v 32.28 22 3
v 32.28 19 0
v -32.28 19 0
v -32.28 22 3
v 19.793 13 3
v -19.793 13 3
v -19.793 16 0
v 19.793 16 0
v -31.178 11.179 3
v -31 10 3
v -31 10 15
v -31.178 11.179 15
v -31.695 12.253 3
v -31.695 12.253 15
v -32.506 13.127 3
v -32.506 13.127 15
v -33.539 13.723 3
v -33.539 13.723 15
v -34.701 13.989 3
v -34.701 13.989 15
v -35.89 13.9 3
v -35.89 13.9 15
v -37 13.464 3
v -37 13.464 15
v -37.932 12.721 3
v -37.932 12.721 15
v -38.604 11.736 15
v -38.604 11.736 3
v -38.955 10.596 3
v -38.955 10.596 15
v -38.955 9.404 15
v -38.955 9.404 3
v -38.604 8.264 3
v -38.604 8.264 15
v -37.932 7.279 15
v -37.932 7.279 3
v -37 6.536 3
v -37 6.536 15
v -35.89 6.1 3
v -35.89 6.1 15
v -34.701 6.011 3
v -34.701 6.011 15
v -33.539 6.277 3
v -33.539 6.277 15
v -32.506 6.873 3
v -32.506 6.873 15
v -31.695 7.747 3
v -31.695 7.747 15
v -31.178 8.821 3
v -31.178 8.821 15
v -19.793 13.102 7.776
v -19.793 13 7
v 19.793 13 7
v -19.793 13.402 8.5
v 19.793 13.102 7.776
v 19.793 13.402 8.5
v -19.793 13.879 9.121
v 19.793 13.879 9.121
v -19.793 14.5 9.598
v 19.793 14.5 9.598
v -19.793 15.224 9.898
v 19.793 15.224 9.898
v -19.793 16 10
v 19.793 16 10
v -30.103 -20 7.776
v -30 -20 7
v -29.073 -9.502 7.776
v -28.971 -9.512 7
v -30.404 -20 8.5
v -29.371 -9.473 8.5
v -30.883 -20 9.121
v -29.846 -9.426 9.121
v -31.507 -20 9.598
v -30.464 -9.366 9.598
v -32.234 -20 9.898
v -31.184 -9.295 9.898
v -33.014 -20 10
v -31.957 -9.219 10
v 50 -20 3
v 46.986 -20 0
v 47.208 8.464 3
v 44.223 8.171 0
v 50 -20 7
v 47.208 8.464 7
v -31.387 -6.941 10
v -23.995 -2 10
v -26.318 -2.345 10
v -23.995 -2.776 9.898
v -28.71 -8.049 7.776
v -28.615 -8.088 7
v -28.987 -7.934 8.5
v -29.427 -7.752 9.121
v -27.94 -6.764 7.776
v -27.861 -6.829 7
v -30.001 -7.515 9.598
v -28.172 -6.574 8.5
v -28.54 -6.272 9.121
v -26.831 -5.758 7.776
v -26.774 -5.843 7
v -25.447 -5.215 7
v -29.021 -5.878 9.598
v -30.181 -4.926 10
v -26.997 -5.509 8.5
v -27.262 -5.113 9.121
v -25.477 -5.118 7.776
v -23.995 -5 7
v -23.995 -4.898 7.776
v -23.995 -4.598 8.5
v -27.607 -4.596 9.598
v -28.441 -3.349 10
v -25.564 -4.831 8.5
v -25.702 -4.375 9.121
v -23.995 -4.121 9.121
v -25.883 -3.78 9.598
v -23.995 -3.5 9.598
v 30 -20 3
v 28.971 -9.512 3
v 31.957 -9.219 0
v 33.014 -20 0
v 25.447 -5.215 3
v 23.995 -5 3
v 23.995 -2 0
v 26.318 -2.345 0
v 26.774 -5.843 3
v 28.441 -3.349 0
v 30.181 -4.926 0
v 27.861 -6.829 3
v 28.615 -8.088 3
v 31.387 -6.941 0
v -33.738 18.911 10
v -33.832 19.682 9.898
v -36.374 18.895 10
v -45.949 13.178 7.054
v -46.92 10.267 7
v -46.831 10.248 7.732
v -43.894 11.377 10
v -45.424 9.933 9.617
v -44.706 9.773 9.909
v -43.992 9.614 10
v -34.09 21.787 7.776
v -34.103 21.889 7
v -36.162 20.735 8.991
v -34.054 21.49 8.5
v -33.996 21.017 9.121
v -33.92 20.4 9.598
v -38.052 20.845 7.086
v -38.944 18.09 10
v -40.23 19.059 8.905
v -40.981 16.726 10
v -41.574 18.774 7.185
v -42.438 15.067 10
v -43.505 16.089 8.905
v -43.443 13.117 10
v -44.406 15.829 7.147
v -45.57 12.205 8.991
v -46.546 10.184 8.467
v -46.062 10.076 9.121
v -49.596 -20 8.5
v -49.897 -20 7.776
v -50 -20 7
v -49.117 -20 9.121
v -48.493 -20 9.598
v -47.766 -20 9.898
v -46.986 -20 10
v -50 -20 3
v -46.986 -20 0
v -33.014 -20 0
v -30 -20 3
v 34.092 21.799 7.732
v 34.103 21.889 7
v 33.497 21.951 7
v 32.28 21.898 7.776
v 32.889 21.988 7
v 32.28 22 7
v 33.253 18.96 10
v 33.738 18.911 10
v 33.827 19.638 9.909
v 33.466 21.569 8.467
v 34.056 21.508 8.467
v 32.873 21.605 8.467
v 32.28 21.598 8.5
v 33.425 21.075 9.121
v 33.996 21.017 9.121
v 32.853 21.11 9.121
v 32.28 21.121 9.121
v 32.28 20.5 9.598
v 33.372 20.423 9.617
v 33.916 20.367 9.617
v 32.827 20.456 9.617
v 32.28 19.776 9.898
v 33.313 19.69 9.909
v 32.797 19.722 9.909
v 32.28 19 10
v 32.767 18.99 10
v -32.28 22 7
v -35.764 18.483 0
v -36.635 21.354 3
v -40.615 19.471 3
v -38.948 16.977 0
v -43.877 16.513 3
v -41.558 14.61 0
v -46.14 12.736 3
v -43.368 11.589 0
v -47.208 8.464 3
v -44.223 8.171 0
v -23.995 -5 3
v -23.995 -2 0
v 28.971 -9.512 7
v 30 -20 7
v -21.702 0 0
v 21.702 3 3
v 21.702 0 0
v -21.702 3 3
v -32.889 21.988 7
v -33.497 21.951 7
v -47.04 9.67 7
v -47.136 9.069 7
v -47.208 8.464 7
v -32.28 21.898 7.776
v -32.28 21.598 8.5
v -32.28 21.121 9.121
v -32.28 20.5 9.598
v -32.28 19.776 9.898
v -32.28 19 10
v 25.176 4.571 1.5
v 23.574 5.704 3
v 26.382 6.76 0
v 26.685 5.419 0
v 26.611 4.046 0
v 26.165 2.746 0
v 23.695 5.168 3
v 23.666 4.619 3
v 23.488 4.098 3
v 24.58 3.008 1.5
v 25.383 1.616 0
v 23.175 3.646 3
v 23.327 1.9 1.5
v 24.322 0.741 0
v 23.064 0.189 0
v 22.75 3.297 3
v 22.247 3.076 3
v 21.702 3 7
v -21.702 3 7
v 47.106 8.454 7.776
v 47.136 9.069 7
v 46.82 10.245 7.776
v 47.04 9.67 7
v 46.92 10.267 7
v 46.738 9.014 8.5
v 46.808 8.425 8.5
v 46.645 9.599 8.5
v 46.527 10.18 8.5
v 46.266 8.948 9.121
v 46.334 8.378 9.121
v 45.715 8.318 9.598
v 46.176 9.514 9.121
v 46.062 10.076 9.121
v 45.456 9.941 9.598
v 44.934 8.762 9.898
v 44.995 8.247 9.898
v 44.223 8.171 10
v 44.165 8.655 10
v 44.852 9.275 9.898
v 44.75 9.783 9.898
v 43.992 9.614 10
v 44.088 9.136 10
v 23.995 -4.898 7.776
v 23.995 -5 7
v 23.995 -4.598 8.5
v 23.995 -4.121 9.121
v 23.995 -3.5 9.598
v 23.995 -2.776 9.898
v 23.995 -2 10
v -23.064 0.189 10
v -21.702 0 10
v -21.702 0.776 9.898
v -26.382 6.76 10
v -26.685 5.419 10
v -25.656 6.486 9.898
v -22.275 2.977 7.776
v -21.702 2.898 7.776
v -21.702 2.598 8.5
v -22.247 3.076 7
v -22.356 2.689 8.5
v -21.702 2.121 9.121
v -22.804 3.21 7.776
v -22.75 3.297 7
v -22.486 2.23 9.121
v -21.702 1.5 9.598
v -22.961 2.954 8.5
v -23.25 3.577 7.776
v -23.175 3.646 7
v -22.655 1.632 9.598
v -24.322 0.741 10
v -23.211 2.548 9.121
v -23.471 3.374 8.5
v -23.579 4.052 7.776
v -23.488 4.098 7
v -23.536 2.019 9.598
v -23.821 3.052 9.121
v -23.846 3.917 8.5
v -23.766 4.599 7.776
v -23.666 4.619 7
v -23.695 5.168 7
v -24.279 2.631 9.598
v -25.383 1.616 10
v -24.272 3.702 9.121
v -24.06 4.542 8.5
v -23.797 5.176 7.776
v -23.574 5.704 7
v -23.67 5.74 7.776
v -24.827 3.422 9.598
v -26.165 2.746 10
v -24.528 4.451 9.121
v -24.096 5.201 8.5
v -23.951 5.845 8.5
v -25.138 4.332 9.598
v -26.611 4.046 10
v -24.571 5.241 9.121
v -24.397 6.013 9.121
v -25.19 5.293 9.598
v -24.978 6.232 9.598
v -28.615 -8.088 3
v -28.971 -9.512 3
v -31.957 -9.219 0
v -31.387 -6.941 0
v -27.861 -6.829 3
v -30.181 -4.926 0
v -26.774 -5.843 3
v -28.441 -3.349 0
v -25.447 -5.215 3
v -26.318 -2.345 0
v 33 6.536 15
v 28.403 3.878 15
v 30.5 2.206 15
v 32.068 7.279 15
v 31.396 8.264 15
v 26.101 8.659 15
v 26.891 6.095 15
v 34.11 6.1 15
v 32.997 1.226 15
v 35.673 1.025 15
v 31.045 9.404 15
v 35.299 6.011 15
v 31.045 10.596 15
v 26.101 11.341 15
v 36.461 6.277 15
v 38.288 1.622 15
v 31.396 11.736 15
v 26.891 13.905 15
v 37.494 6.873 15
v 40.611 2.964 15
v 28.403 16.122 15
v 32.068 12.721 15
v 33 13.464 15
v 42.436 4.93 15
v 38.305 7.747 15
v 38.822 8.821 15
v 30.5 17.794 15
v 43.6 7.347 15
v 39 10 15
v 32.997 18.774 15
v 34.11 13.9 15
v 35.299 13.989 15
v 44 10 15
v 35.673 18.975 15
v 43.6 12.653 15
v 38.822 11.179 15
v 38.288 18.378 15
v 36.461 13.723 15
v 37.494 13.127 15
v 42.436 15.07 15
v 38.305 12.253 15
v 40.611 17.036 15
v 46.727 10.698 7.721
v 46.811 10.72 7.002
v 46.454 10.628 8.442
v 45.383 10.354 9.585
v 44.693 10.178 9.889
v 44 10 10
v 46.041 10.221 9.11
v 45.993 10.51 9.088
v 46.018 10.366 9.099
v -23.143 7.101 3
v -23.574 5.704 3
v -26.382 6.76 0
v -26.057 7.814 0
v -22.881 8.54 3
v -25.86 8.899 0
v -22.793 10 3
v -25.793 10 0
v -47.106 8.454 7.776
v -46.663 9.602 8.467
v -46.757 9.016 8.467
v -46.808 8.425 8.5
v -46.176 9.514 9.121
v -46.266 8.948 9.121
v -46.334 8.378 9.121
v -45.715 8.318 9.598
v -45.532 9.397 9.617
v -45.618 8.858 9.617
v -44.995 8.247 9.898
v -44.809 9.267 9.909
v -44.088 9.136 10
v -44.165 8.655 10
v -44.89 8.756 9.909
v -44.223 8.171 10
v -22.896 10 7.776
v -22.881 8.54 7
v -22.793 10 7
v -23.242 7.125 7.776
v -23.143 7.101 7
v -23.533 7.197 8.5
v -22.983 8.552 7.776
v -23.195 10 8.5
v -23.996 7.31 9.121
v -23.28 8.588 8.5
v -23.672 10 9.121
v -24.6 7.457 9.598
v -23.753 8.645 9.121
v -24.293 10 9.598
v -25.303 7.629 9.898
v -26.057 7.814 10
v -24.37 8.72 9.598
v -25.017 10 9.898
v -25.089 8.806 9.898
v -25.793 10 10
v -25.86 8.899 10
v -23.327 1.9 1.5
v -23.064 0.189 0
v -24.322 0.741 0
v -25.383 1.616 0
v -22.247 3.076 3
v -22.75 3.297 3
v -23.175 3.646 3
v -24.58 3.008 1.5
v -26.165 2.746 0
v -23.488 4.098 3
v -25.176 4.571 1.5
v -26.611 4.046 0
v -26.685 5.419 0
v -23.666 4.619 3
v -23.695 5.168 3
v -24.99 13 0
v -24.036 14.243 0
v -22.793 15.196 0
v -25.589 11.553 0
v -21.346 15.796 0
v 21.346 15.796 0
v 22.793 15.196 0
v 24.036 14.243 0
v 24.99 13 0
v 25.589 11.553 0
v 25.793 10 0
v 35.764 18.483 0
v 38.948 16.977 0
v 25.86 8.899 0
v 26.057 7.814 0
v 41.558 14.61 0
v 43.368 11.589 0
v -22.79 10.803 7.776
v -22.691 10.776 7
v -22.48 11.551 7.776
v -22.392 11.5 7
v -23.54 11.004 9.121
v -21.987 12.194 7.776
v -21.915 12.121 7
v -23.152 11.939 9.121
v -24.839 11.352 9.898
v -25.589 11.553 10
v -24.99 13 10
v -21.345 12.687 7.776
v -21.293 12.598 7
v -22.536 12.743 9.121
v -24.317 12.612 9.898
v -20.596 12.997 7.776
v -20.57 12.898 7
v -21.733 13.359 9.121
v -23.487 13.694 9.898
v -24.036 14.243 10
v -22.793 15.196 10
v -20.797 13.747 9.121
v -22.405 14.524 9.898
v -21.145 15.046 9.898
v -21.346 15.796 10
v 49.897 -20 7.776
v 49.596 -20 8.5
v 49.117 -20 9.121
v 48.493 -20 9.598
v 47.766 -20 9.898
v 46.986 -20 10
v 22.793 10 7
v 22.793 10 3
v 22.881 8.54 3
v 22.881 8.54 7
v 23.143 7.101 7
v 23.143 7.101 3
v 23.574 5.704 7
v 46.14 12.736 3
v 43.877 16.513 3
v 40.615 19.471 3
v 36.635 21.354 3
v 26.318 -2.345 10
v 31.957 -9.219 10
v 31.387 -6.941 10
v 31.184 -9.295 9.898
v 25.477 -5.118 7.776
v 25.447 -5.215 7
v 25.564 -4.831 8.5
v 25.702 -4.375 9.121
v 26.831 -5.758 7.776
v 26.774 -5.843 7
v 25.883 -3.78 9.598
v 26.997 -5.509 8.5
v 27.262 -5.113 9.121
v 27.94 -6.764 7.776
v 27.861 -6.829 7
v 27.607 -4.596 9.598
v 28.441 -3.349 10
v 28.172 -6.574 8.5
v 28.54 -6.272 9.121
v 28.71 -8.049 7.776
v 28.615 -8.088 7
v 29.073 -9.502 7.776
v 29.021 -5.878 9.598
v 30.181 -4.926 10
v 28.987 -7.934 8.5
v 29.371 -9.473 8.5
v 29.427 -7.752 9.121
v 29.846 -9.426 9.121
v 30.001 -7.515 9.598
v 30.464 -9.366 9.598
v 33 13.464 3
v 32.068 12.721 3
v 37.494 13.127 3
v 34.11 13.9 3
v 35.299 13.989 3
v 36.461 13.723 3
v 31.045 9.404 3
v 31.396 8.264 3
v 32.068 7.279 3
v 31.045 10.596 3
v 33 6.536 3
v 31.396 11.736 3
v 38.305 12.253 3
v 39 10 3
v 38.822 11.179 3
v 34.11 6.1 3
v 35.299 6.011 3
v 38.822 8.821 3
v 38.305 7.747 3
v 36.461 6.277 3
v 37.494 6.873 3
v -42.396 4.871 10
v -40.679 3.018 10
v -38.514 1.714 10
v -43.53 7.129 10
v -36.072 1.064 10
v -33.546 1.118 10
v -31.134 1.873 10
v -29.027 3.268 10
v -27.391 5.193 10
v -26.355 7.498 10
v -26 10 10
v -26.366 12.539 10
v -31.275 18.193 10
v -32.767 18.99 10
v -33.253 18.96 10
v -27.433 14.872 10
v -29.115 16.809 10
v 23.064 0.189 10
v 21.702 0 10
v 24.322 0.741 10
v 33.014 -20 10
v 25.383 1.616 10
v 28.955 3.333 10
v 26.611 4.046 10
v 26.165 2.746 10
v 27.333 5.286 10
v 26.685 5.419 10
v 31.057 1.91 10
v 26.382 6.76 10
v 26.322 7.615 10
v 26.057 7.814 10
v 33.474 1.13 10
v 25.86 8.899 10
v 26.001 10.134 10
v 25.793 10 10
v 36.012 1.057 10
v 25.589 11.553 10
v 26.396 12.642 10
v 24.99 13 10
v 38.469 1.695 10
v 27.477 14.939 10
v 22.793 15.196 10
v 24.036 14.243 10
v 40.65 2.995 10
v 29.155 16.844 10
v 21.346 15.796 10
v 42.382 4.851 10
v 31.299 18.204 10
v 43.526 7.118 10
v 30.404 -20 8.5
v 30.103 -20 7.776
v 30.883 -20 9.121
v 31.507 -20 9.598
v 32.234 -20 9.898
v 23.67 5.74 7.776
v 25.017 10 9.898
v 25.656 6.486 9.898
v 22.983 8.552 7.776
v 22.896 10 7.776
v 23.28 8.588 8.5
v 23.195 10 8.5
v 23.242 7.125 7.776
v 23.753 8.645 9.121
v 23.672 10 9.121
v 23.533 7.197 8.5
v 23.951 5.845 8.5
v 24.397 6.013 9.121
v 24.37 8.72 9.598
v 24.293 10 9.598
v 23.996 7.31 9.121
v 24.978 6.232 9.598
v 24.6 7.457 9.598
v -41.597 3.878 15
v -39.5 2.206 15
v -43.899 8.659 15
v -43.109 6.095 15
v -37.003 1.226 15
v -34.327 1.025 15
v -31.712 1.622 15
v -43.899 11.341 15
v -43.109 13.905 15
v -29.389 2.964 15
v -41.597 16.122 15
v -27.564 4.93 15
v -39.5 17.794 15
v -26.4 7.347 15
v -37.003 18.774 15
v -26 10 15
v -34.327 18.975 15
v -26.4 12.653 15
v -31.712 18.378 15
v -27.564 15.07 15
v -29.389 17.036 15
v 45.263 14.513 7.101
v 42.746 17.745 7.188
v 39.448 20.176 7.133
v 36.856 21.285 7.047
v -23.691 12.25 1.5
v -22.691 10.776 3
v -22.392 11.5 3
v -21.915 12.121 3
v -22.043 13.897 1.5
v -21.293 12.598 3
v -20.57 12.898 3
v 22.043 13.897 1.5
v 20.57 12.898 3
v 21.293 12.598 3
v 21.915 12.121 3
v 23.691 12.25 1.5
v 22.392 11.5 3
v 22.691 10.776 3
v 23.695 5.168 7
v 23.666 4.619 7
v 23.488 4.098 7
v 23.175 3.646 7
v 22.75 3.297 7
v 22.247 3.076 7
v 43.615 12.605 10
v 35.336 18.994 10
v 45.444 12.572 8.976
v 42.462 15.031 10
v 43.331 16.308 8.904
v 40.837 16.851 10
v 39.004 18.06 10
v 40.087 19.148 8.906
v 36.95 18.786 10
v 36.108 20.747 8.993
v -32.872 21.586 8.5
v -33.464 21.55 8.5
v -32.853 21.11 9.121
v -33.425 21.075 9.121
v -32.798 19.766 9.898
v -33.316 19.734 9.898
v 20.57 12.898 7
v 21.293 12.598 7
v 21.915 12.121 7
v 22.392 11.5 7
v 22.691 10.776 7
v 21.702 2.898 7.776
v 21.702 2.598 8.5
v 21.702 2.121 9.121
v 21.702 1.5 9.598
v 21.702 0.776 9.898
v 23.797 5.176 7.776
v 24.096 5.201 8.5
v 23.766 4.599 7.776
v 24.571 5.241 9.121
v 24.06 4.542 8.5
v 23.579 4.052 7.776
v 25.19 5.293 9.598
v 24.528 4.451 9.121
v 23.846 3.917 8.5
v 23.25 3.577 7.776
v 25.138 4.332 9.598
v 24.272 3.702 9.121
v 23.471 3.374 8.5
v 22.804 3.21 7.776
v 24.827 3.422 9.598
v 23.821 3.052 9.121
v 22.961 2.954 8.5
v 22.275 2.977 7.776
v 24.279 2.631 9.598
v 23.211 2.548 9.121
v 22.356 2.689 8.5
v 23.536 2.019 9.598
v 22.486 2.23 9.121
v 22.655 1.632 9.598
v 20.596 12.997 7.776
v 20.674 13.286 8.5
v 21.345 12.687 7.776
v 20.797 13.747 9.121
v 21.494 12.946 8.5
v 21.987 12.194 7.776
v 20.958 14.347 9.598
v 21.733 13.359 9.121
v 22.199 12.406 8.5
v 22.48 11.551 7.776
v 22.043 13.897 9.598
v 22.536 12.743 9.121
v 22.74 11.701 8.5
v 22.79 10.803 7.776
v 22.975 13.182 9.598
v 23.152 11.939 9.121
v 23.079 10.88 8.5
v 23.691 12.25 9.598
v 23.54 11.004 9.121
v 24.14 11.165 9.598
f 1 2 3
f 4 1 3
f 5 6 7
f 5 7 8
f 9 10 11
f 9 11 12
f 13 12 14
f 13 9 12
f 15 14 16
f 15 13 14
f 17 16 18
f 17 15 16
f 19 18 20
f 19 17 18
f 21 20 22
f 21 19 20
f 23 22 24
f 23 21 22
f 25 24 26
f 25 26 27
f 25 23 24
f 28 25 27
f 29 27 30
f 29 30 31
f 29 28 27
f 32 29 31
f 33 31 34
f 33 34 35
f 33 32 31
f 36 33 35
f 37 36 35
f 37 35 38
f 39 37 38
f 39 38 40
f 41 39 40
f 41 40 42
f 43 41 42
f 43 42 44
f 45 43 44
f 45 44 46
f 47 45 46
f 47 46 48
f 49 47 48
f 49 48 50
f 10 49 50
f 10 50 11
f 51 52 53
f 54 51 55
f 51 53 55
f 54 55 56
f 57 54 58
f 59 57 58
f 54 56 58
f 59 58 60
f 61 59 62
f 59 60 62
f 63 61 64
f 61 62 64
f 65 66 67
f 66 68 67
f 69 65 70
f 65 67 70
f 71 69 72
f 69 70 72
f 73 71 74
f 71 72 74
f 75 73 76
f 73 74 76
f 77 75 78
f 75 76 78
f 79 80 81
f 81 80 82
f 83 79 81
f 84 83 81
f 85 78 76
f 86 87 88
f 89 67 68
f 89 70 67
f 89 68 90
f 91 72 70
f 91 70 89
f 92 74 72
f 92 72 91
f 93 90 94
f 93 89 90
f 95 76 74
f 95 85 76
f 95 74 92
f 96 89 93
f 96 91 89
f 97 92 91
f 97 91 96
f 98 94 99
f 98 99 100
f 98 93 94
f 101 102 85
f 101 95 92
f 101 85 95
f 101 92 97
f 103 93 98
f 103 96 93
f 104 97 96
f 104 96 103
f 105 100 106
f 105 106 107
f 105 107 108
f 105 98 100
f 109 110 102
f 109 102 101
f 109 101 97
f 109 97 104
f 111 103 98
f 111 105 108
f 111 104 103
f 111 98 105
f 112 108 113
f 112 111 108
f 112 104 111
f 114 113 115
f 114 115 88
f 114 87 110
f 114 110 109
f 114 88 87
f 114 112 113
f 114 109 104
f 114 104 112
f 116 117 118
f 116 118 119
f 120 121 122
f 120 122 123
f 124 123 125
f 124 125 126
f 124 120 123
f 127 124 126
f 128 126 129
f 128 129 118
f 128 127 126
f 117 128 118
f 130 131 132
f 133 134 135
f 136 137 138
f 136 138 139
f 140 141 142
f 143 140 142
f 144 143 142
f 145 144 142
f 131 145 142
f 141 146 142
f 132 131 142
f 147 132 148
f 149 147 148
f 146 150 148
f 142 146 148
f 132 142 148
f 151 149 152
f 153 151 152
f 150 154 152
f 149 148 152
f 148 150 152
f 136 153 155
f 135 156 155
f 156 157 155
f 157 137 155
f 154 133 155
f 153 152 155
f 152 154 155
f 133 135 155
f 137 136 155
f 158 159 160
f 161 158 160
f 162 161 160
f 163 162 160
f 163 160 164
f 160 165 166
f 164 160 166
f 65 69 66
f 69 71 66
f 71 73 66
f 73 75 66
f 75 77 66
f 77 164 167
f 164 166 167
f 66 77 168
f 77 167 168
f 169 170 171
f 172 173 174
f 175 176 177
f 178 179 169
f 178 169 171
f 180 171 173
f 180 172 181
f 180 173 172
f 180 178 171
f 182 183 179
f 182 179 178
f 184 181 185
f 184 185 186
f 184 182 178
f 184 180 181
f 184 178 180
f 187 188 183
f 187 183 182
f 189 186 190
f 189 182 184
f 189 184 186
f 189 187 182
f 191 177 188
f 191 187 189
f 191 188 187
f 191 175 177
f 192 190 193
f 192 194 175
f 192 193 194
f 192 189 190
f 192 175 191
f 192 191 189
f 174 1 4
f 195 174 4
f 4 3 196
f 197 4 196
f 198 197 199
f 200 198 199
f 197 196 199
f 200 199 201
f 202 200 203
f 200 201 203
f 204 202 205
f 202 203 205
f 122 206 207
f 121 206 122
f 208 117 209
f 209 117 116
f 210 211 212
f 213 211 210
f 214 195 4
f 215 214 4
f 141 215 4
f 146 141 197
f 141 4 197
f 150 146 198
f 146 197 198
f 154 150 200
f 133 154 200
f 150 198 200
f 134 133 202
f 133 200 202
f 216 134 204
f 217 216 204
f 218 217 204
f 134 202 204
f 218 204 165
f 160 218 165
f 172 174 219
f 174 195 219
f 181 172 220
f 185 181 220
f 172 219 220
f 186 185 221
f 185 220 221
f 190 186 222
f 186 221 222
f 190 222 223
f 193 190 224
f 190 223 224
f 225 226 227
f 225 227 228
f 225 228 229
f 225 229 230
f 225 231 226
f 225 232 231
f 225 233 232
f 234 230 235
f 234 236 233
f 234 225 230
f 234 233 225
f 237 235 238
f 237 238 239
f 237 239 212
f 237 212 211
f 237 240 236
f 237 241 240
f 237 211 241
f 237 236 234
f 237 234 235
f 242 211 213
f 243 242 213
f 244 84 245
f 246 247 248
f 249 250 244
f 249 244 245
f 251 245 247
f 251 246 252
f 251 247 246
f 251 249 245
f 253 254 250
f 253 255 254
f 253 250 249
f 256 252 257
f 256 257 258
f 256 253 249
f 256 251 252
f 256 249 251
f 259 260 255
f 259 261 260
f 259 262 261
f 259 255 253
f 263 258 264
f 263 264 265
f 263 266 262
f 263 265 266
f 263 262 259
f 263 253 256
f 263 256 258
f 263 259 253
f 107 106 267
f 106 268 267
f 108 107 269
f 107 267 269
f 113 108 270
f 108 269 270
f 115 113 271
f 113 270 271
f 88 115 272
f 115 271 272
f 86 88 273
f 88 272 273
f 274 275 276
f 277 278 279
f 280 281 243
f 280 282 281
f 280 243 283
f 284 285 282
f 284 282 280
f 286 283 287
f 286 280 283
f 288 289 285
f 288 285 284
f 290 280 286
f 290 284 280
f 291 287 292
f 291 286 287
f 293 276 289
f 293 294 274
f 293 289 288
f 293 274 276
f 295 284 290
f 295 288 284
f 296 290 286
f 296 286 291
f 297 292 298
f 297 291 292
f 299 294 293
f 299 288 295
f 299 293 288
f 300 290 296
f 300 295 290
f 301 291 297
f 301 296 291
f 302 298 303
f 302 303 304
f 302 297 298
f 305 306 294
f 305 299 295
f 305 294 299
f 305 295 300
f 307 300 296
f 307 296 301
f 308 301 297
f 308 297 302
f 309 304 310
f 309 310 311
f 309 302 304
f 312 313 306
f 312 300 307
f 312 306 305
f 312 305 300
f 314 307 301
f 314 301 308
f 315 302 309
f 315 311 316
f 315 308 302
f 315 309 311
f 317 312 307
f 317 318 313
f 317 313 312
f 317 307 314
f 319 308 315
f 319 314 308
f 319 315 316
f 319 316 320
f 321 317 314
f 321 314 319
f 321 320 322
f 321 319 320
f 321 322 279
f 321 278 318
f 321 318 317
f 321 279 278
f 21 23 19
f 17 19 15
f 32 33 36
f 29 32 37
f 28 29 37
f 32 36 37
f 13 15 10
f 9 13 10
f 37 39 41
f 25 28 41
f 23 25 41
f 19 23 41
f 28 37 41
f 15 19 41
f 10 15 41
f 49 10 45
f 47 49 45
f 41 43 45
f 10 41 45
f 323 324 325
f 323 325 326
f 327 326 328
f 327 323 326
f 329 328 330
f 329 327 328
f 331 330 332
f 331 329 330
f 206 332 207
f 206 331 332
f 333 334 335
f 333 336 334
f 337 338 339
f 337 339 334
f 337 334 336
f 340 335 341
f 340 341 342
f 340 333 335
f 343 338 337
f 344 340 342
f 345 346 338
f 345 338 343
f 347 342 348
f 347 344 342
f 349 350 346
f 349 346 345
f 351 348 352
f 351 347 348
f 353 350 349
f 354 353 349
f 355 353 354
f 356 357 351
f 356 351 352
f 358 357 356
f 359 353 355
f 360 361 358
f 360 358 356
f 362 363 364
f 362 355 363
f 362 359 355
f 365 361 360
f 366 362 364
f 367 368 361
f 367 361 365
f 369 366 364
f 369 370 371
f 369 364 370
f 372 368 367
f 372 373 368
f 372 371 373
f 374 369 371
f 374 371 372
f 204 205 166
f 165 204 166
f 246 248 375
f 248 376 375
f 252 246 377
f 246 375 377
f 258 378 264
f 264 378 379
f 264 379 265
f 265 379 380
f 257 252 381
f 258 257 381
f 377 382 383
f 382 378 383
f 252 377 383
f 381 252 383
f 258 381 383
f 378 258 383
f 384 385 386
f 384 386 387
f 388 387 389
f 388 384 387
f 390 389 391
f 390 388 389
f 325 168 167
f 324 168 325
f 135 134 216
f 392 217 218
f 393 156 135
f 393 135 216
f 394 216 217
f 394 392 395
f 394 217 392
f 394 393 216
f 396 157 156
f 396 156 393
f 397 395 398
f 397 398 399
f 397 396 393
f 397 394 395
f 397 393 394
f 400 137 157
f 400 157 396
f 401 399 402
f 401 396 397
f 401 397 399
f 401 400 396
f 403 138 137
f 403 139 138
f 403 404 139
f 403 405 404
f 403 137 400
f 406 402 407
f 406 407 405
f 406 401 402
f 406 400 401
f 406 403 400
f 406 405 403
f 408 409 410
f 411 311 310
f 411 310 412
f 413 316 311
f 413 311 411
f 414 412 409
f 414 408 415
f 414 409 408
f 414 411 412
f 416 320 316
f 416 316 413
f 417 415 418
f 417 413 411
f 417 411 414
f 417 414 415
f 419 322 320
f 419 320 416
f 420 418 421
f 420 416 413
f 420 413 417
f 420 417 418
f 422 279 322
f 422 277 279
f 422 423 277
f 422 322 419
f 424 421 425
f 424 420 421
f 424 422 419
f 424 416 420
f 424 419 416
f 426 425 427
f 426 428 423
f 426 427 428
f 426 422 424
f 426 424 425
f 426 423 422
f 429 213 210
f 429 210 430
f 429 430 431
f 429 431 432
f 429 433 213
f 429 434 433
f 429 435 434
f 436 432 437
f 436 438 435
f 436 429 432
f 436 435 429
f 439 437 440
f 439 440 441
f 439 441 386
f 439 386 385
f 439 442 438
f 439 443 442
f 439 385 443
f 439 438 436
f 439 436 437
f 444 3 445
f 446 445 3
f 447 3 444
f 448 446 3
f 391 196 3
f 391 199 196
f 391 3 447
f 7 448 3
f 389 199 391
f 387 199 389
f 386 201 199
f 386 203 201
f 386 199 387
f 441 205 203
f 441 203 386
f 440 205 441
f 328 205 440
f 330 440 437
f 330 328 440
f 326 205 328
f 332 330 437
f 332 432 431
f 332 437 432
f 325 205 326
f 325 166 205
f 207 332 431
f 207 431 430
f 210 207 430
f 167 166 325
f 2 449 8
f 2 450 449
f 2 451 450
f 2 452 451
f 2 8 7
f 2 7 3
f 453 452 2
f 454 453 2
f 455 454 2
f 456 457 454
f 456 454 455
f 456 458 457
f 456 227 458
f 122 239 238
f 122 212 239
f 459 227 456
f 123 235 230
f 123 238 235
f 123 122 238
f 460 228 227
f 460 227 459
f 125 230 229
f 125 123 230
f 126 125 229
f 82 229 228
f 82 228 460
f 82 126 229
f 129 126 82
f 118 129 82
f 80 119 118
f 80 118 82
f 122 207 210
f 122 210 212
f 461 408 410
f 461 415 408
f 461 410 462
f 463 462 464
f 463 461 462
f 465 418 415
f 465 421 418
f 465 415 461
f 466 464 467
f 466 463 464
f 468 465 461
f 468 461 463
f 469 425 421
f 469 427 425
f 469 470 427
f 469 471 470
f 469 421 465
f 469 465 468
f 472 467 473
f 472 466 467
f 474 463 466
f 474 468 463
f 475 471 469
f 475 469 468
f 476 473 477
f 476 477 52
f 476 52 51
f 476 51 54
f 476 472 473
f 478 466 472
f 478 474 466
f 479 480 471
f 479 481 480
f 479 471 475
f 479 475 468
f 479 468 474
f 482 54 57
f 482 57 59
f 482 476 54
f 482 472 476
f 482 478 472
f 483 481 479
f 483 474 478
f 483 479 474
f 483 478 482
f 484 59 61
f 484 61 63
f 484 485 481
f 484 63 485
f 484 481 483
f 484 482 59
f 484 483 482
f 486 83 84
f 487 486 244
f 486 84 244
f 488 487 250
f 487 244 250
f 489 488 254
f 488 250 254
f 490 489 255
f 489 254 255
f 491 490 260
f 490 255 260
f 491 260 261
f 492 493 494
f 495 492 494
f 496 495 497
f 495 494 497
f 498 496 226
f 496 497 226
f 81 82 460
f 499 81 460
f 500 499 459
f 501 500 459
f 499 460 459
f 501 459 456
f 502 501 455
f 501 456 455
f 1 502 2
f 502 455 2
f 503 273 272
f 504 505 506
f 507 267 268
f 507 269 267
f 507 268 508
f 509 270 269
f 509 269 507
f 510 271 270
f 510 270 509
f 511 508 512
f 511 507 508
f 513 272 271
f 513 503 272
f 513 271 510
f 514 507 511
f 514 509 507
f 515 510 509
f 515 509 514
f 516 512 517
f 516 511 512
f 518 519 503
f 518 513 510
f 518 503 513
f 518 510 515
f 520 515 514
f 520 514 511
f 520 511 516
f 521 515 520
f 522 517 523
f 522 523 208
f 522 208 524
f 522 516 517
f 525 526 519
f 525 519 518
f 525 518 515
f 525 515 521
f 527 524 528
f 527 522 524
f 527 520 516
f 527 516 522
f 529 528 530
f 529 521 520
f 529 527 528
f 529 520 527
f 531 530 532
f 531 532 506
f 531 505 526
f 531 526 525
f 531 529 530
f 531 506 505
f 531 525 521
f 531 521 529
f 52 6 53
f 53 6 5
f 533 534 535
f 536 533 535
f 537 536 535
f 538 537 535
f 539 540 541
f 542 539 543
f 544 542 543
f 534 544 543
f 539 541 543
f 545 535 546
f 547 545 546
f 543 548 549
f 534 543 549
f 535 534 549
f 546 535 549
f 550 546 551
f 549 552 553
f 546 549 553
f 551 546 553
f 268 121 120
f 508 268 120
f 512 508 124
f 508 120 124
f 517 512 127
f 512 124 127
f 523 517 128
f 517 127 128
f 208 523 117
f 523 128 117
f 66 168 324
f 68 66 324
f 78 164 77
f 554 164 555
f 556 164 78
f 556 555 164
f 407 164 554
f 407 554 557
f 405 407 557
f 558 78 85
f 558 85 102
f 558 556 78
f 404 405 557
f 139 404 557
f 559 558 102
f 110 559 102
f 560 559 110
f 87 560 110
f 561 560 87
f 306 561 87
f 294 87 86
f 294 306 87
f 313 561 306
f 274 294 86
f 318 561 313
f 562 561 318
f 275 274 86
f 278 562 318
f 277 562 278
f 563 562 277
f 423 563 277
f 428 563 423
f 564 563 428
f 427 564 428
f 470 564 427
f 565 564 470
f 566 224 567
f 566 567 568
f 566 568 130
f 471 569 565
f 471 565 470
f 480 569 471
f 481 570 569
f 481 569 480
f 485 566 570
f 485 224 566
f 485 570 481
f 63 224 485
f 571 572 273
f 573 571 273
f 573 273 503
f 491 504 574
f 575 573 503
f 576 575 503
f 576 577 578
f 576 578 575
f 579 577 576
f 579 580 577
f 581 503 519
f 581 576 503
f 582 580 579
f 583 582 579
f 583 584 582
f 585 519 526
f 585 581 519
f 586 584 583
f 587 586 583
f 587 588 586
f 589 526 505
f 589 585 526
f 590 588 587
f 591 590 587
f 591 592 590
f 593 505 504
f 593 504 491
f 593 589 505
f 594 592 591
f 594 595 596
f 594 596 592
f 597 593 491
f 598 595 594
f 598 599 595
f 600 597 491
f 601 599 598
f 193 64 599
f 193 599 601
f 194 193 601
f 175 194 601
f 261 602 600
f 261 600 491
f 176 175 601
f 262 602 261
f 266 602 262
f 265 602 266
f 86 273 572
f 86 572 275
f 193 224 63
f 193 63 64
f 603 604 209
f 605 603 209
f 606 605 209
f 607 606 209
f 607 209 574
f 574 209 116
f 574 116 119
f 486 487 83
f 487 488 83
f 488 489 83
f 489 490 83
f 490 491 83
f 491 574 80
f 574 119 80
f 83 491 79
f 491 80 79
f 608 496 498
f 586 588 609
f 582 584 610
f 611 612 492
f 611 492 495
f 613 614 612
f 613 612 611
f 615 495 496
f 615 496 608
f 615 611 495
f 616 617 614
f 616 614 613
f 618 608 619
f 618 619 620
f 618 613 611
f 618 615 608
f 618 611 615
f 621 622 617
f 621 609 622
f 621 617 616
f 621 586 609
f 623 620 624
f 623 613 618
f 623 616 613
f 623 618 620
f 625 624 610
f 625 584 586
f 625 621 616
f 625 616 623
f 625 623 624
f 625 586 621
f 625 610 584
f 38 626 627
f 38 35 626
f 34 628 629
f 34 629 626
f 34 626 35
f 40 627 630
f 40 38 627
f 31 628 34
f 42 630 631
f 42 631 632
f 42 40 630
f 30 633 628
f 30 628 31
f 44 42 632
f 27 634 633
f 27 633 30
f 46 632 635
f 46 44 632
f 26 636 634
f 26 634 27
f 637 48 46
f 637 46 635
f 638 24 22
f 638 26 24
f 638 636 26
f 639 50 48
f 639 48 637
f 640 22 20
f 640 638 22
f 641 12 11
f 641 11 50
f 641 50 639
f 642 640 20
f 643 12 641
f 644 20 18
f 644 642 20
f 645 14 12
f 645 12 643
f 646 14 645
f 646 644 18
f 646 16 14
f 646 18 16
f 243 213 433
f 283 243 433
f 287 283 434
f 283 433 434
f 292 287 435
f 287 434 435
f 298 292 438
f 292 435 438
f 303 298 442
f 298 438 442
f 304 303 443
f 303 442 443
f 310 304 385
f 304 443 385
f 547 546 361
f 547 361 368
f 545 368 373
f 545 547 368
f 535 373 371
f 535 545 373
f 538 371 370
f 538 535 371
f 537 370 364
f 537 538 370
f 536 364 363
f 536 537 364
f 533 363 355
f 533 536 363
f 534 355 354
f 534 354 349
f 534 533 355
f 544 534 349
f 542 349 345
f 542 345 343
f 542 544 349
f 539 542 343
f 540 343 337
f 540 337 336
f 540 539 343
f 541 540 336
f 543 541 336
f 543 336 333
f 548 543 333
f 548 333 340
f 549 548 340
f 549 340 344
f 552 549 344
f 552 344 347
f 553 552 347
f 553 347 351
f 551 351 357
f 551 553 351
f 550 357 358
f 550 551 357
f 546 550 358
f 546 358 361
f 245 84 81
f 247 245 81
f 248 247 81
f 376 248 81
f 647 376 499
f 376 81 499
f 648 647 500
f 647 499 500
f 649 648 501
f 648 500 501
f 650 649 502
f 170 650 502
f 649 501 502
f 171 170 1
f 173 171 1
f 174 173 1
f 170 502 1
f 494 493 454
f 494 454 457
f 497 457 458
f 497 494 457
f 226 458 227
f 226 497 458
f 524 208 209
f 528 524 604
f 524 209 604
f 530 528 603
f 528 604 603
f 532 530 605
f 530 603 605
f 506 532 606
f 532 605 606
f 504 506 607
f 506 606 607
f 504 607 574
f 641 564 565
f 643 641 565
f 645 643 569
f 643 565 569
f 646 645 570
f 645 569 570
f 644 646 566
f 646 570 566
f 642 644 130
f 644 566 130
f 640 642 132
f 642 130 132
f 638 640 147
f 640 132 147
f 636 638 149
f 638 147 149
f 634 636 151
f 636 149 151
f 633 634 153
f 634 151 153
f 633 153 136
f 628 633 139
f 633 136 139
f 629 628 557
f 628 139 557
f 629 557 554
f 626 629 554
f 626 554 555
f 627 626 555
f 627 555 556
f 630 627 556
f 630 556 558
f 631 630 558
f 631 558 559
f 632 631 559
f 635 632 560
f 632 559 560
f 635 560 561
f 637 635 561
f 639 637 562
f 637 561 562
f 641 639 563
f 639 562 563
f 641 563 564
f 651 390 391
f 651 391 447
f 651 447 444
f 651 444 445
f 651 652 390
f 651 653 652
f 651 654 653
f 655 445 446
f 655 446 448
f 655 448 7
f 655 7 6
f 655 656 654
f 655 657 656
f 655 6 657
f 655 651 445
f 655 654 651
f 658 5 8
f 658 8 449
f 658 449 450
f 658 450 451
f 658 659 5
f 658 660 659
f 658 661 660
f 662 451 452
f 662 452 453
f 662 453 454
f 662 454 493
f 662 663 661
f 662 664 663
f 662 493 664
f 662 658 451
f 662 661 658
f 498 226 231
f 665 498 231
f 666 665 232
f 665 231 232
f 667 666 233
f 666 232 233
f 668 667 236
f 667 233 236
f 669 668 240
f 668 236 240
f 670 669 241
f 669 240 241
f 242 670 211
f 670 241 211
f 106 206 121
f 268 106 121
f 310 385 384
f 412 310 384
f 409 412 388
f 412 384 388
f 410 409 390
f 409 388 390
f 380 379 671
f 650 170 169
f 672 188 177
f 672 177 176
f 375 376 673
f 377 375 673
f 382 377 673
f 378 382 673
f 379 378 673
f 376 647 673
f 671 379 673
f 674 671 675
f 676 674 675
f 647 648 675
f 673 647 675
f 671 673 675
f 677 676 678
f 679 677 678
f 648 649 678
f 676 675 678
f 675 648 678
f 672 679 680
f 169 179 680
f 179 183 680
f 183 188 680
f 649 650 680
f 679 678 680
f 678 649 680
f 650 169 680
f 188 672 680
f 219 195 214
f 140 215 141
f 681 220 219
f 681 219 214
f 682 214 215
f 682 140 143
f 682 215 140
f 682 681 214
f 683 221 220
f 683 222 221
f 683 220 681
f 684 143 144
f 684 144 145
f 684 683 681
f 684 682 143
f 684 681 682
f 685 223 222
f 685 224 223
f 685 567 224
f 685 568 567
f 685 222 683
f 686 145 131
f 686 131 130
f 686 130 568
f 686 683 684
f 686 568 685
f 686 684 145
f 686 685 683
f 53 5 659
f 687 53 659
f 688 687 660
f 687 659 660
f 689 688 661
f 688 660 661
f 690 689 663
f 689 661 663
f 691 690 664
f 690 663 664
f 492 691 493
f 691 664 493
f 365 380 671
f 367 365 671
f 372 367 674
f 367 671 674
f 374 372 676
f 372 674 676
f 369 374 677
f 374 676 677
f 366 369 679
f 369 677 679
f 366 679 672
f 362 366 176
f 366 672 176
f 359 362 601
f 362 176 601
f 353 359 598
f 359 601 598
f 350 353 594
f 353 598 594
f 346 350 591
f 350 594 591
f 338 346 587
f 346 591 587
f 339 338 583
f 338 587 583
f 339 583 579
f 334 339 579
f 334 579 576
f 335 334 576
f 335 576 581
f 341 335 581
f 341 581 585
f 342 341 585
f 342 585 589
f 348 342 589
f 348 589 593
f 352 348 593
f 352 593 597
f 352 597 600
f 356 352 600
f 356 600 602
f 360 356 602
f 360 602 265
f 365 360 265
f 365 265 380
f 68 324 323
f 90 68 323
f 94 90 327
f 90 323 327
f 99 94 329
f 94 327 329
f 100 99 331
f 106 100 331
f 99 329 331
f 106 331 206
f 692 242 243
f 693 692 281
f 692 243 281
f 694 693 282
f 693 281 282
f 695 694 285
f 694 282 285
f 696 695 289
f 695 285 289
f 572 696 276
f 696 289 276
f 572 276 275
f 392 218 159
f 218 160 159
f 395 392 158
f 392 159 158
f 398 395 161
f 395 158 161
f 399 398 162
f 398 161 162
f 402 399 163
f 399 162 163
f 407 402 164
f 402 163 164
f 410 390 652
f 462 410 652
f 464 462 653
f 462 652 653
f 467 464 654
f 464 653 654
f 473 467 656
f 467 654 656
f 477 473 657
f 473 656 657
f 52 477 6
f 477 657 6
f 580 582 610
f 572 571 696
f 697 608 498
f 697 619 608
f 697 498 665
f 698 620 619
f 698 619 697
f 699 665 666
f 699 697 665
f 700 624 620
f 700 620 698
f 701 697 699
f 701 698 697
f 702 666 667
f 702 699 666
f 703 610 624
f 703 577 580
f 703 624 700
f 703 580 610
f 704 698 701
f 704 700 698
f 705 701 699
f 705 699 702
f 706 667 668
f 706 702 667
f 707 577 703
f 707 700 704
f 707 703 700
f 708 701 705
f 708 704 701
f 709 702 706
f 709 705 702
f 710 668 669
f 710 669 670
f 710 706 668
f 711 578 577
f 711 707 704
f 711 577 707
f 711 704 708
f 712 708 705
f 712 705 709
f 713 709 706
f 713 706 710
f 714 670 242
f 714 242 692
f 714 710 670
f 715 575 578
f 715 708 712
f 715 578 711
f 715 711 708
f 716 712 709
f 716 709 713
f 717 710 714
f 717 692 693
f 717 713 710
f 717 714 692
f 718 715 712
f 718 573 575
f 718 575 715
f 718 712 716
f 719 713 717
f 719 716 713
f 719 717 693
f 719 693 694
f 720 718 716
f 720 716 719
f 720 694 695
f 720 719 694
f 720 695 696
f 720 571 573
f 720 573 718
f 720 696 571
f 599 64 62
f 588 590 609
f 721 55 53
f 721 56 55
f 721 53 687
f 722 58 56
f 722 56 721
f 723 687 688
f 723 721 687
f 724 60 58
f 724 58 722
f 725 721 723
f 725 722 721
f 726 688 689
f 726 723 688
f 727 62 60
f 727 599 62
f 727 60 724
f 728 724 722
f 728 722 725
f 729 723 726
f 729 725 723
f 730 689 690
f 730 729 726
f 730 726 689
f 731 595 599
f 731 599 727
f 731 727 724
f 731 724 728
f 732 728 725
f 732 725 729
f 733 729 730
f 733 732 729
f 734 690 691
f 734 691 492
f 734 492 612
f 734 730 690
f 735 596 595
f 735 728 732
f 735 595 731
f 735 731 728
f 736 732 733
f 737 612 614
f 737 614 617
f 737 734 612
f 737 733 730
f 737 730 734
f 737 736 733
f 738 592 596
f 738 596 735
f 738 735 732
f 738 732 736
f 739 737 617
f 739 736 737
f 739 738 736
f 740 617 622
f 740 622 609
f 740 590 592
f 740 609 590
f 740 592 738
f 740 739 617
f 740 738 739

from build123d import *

# Parameters (mm, degrees)
F0_R     = 4
F1_DEPTH = 10
F2_R     = 9
F2_R_2   = 4
F3_DEPTH = 5
F4_R     = 4
F5_DEPTH = 3
F6_R     = 3
F7_SIZE  = 3


with BuildPart() as f1:
    # F0 (on Top) → F1 (new body)
    with BuildSketch(Plane.XY):
        with BuildLine():
            Line((32.279847, 22), (0, 22))
            Line((0, 22), (-32.279847, 22))
            ThreePointArc((-32.279847, 22), (-42.355492, 18.112218), (-47.208215, 8.464184))
            Line((-47.208215, 8.464184), (-50, -20))
            Line((-50, -20), (-30, -20))
            Line((-30, -20), (-28.971324, -9.511939))
            ThreePointArc((-28.971324, -9.511939), (-27.35375, -6.295927), (-23.995202, -5))
            Line((-23.995202, -5), (0, -5))
            Line((0, -5), (23.995202, -5))
            ThreePointArc((23.995202, -5), (27.35375, -6.295927), (28.971324, -9.511939))
            Line((28.971324, -9.511939), (30, -20))
            Line((30, -20), (50, -20))
            Line((50, -20), (47.208215, 8.464184))
            ThreePointArc((47.208215, 8.464184), (42.355492, 18.112218), (32.279847, 22))
        make_face()
        with Locations((-35, 10)):
            Circle(F0_R, mode=Mode.SUBTRACT)
        with BuildLine():
            Line((21.702398, 3), (0, 3))
            Line((0, 3), (-21.702398, 3))
            ThreePointArc((-21.702398, 3), (-23.346752, 3.861536), (-23.574435, 5.7039))
            ThreePointArc((-23.574435, 5.7039), (-22.990279, 7.816744), (-22.793444, 10))
            ThreePointArc((-22.793444, 10), (-21.914765, 12.12132), (-19.793444, 13))
            Line((-19.793444, 13), (19.793444, 13))
            ThreePointArc((19.793444, 13), (21.914765, 12.12132), (22.793444, 10))
            ThreePointArc((22.793444, 10), (22.990279, 7.816744), (23.574435, 5.7039))
            ThreePointArc((23.574435, 5.7039), (23.346752, 3.861536), (21.702398, 3))
        make_face(mode=Mode.SUBTRACT)
        with Locations((35, 10)):
            Circle(F0_R, mode=Mode.SUBTRACT)
    extrude(amount=F1_DEPTH)

    # F2 (on face) → F3 (join)
    with BuildSketch(Plane.XY.offset(10)):
        with Locations((35, 10)):
            Circle(F2_R)
        with Locations((35, 10)):
            Circle(F2_R_2, mode=Mode.SUBTRACT)
        with Locations((-35, 10)):
            Circle(F2_R)
        with Locations((-35, 10)):
            Circle(F2_R_2, mode=Mode.SUBTRACT)
    extrude(amount=F3_DEPTH)

    # F4 (on face) → F5 (join)
    with BuildSketch(Plane(origin=(0, 0, 0), x_dir=(1, 0, 0), z_dir=(0, 0, -1))):
        with Locations((35, -10)):
            Circle(F4_R)
        with Locations((-35, -10)):
            Circle(F4_R)
    extrude(amount=-F5_DEPTH)

    # F6
    f6_edges = [f1.edges().sort_by_distance(p)[0] for p in [
        (0, -5, 10),
        (0, 22, 10),
        (0, 13, 10),
    ]]
    fillet(f6_edges, radius=F6_R)

    # F7
    f7_edges = [f1.edges().sort_by_distance(p)[0] for p in [
        (42.355492, 18.112218, 0),
        (0, 13, 0),
        (0, -5, 0),
    ]]
    chamfer(f7_edges, length=F7_SIZE)


solid = f1.part
